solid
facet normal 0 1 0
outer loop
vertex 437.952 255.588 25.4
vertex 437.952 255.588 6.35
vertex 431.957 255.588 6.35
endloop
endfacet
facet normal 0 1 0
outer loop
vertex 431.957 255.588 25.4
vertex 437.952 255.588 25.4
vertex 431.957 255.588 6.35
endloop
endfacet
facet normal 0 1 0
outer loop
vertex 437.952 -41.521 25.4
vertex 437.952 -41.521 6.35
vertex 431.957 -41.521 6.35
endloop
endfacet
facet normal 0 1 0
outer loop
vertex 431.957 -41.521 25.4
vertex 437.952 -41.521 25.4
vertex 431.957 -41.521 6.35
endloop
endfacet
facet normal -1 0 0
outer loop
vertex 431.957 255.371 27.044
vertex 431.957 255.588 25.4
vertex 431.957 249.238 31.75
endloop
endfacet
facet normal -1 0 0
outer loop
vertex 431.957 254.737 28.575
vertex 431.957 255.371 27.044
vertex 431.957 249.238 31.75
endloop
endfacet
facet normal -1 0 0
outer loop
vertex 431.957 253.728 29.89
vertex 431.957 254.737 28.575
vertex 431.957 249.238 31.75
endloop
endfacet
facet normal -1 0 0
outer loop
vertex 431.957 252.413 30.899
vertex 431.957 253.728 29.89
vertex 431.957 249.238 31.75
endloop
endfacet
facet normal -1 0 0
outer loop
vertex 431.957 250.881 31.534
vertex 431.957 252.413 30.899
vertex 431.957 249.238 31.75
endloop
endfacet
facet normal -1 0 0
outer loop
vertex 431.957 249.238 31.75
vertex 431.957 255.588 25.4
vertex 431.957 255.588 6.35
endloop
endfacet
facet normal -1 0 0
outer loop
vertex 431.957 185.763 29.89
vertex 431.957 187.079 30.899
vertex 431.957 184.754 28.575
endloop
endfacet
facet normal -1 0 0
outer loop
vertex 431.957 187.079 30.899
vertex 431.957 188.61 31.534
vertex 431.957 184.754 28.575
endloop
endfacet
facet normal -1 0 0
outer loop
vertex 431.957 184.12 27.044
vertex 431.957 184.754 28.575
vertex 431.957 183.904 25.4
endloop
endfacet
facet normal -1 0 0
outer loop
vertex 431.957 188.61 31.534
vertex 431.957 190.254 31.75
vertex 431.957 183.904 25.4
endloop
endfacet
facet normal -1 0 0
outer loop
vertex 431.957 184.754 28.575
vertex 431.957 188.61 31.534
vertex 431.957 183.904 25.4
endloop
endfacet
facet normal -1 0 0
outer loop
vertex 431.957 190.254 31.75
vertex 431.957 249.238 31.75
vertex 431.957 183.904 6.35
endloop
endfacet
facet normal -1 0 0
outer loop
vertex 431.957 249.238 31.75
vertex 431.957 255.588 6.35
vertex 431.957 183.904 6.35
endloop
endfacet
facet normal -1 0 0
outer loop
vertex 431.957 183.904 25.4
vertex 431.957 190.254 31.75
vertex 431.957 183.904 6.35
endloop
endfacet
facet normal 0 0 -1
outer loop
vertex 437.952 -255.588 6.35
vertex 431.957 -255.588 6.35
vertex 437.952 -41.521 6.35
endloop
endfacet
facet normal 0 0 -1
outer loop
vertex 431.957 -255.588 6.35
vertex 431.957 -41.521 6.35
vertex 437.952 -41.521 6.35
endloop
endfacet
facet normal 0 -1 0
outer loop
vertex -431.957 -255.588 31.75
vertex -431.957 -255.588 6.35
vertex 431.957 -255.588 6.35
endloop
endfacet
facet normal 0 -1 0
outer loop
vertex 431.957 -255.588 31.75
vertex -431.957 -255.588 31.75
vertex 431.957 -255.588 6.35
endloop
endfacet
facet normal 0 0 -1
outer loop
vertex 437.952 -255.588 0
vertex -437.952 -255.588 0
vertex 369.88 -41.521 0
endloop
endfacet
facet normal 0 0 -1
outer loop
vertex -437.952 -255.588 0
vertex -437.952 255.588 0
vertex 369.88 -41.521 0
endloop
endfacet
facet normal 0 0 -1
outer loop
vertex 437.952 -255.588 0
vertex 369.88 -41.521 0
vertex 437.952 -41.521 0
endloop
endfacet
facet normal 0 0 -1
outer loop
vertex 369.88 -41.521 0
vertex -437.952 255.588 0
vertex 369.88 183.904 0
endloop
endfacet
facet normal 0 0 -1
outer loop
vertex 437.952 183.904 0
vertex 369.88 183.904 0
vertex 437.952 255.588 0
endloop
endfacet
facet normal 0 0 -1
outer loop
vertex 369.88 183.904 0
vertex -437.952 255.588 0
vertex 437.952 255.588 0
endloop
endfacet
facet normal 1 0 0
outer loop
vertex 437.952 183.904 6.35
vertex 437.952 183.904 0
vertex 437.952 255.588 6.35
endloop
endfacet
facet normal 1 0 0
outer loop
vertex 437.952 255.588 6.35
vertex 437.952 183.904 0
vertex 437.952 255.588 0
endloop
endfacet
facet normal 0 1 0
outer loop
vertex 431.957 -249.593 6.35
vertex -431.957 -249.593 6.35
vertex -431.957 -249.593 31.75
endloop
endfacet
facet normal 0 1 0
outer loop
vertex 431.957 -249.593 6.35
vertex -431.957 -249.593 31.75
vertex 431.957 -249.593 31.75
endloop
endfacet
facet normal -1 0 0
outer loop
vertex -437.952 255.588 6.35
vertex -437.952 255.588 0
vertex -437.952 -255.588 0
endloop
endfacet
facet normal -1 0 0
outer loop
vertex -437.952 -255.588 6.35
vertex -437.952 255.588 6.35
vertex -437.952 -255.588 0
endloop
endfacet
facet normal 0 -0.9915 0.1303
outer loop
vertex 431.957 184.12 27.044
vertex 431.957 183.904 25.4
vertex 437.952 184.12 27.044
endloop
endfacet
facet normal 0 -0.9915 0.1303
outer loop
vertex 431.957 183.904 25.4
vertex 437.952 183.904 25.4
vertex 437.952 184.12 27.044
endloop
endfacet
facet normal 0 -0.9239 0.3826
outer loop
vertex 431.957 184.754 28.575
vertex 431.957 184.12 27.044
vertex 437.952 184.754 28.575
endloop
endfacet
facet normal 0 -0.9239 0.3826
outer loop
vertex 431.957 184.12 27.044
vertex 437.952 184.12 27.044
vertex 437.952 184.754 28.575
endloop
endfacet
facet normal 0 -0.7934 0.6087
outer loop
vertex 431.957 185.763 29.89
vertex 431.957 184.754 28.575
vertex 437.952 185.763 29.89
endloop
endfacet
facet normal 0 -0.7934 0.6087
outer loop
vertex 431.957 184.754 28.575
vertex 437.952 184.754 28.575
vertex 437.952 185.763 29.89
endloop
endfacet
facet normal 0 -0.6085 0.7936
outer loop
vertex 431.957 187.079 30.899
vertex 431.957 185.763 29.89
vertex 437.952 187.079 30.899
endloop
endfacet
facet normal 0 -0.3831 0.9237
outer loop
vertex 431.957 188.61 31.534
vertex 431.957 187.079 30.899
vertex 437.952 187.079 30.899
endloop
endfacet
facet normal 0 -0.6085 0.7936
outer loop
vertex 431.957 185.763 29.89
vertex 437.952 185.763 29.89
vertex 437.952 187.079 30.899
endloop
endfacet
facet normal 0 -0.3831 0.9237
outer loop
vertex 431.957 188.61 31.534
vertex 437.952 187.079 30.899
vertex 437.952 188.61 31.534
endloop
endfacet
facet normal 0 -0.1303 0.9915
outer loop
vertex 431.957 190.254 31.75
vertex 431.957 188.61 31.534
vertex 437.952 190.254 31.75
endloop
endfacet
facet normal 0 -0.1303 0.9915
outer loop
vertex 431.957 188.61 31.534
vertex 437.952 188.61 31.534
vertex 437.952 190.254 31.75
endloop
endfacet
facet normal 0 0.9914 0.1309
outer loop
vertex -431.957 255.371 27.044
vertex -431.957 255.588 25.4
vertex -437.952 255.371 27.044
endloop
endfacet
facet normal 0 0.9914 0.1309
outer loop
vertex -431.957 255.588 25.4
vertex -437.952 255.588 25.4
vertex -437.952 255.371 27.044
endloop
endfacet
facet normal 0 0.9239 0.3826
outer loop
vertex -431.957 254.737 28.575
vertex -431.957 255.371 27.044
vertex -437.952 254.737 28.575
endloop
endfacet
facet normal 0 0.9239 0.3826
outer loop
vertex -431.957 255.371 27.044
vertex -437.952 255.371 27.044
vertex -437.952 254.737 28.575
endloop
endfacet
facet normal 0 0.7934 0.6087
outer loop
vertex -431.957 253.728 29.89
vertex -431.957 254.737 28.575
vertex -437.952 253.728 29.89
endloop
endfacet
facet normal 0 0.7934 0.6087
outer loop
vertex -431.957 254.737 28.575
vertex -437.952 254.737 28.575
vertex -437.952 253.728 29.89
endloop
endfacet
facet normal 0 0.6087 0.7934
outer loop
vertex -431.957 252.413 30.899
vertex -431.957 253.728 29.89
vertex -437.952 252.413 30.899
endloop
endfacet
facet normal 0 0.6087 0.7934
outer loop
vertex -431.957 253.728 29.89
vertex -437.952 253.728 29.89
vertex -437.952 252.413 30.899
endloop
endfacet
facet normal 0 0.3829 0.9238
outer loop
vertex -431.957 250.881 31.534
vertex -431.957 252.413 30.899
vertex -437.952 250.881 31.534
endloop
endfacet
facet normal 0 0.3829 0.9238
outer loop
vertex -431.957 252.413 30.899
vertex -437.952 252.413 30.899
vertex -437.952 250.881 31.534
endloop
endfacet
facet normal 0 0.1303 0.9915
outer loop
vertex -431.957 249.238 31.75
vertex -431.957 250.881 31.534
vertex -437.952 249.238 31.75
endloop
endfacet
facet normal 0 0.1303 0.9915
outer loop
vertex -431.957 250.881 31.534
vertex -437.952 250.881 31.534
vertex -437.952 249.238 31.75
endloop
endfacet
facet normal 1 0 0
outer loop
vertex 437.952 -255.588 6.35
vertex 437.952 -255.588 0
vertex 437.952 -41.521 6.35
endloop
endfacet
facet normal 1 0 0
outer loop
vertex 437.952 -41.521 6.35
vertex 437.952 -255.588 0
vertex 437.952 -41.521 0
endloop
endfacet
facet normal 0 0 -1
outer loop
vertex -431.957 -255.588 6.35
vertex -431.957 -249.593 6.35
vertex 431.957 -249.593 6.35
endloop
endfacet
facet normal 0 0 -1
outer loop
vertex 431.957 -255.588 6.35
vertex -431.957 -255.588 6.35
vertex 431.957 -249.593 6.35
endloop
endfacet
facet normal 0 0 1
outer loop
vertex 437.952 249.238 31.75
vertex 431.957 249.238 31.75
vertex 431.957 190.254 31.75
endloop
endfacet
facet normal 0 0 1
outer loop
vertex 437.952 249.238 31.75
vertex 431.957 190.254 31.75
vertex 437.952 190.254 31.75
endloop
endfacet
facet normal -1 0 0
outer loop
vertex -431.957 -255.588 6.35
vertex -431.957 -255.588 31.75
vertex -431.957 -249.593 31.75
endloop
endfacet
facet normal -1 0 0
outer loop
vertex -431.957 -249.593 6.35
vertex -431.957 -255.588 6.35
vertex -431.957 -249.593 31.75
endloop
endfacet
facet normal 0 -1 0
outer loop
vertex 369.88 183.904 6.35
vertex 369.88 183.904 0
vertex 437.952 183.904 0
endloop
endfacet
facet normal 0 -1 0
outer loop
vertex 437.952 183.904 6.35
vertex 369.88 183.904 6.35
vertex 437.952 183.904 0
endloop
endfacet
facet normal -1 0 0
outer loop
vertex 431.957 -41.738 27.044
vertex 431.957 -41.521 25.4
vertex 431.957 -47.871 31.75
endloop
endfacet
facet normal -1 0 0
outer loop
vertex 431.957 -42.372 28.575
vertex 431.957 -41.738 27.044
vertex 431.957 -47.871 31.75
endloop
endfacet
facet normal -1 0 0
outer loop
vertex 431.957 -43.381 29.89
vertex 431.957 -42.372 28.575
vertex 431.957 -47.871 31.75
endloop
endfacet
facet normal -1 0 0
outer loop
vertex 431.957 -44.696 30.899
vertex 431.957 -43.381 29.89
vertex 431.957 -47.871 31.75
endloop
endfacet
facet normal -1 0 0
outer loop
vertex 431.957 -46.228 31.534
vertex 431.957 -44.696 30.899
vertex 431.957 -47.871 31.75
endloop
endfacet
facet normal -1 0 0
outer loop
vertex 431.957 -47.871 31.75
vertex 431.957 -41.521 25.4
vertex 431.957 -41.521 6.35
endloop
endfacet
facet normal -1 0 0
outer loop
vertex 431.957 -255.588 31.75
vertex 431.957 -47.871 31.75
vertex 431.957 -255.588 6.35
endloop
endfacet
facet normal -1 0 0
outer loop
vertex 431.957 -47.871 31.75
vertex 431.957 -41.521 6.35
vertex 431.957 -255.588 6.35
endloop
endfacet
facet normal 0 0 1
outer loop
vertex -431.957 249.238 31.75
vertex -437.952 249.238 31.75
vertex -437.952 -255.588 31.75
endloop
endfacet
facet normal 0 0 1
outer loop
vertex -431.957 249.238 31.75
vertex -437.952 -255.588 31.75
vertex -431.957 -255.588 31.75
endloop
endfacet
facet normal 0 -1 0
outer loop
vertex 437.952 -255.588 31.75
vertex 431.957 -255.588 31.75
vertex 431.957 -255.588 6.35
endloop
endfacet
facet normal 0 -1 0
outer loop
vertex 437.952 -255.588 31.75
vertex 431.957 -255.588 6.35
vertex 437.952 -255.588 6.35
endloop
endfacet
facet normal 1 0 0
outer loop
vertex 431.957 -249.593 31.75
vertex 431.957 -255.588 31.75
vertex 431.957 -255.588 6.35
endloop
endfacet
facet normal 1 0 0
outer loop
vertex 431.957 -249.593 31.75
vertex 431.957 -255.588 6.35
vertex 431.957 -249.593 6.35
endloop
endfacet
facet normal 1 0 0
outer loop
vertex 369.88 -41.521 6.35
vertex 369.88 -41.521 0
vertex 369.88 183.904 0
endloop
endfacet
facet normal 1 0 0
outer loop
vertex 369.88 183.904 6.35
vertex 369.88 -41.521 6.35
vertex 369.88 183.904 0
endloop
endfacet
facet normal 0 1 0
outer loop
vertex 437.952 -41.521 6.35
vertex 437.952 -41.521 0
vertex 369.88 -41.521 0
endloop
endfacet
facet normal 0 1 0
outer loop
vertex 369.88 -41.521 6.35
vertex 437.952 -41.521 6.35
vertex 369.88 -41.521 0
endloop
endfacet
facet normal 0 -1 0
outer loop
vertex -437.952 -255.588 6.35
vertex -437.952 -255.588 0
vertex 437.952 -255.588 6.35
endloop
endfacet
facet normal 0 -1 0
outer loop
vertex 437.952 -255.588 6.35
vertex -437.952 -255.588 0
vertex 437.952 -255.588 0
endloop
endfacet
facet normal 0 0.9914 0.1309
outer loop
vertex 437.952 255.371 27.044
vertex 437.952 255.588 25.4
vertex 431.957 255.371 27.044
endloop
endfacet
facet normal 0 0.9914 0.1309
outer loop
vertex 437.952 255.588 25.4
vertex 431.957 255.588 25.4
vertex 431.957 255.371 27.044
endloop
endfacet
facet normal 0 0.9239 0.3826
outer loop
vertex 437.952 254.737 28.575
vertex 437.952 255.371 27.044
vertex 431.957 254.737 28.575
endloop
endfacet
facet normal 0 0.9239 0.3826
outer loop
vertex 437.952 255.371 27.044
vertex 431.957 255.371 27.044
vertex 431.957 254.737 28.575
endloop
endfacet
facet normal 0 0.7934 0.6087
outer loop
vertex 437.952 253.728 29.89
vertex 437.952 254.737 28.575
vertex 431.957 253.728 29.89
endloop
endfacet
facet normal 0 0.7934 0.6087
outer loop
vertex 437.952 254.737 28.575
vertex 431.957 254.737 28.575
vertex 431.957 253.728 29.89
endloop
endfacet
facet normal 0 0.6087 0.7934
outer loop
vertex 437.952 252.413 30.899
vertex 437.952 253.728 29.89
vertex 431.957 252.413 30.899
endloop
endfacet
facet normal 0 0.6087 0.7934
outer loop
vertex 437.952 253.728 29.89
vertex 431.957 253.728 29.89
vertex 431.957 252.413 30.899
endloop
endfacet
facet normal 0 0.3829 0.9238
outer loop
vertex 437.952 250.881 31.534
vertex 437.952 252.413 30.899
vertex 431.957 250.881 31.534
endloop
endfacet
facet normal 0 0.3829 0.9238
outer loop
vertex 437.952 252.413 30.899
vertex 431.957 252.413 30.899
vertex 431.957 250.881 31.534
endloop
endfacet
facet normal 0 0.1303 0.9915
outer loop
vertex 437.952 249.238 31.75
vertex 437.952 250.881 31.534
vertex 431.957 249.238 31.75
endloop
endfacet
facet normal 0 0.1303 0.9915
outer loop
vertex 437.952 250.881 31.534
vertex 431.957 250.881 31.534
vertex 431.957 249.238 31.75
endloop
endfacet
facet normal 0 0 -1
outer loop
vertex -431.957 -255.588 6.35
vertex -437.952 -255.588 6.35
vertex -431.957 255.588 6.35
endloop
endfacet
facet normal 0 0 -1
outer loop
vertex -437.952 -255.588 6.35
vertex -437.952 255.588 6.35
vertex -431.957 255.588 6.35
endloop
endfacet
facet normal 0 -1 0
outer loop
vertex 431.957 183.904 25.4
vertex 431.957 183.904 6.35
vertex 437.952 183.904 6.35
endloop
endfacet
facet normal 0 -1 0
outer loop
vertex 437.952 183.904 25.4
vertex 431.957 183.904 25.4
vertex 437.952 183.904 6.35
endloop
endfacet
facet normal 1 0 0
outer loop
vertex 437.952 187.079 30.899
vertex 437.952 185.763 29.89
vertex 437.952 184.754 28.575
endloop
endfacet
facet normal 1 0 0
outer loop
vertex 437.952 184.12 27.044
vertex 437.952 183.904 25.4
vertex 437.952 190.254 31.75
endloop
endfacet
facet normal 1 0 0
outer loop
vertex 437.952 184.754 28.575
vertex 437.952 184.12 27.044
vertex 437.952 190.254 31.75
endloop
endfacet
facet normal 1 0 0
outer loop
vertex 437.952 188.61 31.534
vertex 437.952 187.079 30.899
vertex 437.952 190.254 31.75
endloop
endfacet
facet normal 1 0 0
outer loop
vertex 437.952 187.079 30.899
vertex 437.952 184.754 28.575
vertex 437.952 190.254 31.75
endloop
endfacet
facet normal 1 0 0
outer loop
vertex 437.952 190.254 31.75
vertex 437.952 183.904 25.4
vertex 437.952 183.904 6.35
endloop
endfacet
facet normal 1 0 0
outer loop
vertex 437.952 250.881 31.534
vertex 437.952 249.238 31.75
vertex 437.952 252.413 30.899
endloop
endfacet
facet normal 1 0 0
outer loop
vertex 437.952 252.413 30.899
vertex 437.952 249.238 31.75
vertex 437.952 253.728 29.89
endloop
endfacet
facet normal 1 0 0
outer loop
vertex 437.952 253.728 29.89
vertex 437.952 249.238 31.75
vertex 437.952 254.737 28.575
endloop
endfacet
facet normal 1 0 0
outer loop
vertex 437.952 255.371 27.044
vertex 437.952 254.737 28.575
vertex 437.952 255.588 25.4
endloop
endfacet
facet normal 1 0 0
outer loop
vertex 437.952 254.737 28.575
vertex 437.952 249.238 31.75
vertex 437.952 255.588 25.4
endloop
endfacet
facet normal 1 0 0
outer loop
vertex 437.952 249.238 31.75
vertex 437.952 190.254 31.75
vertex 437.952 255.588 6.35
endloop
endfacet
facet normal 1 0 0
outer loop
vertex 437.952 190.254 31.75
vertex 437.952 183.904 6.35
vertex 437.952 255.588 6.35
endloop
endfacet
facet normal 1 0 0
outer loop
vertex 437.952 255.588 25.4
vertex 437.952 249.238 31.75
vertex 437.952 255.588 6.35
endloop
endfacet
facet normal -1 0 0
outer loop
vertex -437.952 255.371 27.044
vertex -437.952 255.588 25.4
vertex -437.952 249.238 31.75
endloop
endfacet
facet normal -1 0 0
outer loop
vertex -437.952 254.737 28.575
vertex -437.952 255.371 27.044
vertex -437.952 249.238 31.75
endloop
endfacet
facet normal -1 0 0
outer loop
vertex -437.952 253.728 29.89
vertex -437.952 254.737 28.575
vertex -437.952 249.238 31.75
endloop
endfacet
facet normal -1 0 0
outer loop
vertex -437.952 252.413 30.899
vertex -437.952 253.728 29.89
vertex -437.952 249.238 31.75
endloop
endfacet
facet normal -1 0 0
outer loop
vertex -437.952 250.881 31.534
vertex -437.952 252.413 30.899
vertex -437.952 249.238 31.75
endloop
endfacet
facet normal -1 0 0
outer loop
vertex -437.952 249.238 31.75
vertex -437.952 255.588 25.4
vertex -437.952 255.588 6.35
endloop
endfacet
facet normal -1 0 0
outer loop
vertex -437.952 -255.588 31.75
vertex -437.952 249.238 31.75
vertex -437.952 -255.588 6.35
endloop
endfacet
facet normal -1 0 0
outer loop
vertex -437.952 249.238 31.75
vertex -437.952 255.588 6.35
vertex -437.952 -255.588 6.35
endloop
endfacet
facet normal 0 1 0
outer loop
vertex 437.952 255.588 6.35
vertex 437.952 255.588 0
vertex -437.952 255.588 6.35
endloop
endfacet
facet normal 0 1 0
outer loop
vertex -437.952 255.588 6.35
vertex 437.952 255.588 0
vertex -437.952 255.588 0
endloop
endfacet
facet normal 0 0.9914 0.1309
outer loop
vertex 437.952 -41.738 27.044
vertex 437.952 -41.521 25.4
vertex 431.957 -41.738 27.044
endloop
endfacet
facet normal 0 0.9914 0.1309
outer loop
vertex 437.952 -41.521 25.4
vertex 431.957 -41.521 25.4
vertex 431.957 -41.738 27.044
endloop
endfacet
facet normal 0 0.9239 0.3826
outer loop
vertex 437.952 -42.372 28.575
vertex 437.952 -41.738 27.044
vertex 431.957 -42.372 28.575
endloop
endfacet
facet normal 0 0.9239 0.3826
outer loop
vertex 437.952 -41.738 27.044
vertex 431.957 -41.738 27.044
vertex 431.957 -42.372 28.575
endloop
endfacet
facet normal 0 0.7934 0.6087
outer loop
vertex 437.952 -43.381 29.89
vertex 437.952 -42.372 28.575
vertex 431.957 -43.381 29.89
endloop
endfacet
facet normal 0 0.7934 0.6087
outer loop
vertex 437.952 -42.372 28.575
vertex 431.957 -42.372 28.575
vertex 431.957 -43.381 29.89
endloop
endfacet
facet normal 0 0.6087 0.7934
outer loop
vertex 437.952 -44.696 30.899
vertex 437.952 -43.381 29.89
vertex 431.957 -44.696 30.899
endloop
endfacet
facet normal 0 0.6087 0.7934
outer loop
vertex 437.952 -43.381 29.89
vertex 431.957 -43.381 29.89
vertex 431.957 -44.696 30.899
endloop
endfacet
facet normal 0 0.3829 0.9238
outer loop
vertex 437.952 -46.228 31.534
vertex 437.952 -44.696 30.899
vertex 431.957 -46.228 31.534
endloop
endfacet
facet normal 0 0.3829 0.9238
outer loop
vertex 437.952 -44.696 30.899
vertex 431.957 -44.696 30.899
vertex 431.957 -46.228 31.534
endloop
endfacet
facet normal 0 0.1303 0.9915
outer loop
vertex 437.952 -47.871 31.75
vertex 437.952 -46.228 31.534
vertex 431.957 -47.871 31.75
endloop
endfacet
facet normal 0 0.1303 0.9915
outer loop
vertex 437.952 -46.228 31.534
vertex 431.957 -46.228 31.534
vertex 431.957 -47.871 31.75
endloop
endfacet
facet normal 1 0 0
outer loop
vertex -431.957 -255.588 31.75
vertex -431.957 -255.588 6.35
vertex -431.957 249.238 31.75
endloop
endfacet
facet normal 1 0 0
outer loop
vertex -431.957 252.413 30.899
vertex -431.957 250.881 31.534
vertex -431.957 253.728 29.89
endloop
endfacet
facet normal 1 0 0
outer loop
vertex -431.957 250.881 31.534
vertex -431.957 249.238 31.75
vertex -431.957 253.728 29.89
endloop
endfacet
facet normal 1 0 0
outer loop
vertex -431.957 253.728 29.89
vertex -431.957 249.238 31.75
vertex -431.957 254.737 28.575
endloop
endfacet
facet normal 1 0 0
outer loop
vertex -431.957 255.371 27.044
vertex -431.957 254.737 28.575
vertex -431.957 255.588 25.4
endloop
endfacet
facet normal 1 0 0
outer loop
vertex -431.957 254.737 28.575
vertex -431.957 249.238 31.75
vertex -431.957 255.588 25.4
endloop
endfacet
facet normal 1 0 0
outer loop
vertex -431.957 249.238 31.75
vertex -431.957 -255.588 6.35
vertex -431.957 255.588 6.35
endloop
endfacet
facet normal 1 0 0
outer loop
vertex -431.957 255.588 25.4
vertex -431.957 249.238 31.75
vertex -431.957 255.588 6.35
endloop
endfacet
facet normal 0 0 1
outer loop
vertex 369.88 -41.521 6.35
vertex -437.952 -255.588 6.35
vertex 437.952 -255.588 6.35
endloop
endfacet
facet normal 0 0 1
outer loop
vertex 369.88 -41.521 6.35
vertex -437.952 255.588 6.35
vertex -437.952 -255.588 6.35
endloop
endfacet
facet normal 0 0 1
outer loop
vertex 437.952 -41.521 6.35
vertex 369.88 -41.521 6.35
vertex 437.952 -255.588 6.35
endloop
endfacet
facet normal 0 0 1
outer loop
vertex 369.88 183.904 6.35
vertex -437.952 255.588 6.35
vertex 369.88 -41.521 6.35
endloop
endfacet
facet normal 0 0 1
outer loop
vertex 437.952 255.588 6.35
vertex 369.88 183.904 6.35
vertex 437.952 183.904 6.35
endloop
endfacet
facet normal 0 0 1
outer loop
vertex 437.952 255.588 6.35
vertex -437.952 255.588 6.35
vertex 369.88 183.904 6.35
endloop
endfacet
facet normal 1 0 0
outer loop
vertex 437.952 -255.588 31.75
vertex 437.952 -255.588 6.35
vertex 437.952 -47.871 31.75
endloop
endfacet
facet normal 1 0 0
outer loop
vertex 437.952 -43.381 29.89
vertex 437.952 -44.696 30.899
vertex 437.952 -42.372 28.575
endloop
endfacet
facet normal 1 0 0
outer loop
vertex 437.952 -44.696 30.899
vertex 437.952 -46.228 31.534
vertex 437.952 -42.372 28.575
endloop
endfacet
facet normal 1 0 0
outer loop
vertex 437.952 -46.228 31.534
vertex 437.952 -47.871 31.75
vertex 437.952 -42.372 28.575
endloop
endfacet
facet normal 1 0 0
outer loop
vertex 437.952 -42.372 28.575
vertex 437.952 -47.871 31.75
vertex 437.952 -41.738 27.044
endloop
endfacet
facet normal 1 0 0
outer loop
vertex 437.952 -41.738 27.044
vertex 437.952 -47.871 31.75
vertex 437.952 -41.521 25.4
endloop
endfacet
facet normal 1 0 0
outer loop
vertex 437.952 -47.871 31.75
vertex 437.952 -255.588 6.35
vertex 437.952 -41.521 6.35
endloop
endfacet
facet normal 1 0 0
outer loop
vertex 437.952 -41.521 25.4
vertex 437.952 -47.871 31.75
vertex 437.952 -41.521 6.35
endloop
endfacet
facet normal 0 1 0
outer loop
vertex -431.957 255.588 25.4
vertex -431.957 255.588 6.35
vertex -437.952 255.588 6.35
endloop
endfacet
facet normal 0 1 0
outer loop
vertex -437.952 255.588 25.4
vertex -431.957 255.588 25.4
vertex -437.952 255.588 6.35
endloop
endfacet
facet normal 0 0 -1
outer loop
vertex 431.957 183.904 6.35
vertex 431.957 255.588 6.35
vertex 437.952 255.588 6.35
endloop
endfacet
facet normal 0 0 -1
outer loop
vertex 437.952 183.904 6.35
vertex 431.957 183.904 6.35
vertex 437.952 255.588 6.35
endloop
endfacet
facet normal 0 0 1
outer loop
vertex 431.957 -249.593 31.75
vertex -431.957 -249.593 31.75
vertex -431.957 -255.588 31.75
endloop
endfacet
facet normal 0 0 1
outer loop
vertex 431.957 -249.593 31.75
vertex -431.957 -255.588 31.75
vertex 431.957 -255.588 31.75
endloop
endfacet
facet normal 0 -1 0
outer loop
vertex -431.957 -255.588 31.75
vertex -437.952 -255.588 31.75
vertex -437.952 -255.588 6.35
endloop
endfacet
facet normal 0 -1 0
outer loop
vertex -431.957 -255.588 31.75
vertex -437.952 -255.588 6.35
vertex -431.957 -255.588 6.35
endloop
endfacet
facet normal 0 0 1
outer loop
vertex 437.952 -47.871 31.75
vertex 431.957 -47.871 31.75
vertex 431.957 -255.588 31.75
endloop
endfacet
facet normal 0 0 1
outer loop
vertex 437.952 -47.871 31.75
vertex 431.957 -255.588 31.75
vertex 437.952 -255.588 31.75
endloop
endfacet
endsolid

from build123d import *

# Parameters (mm, degrees)
F1_DEPTH = 6.35
F3_DEPTH = 25.4
F4_DEPTH = 25.4
F2_W     = 863.914325
F2_H     = 5.9944
F5_DEPTH = 25.4
F6_DEPTH = 25.4
F7_R     = 6.35
F7_2_R   = 6.35
F7_3_R   = 6.35


with BuildPart() as f1:
    # F0 (on Top) → F1 (new body)
    with BuildSketch(Plane.XY):
        Polygon((-437.9515625, -255.5875), (437.9515625, -255.5875), (437.9515625, -41.52138), (369.8795625, -41.52138), (369.8795625, 183.90362), (437.9515625, 183.90362), (437.9515625, 255.5875), (-437.9515625, 255.5875), align=None)
    extrude(amount=F1_DEPTH)


with BuildPart() as f3:
    # F2 (on face) → F3 (new body)
    with BuildSketch(Plane.XY.offset(6.35)):
        Polygon((-437.9515625, -255.5875), (-431.9571625, -255.5875), (-431.9571625, -249.5931), (-431.9571625, 255.5875), (-437.9515625, 255.5875), align=None)
    extrude(amount=F3_DEPTH)

    # F7#3
    f7_3_edges = [f3.edges().sort_by_distance(p)[0] for p in [
        (-434.954363, 255.5875, 31.75),
    ]]
    fillet(f7_3_edges, radius=F7_3_R)


with BuildPart() as f4:
    # F2 (on face) → F4 (new body)
    with BuildSketch(Plane.XY.offset(6.35)):
        Polygon((431.9571625, -249.5931), (431.9571625, -255.5875), (437.9515625, -255.5875), (437.9515625, -41.52138), (431.9571625, -41.52138), align=None)
    extrude(amount=F4_DEPTH)

    # F7#2
    f7_2_edges = [f4.edges().sort_by_distance(p)[0] for p in [
        (434.954363, -41.52138, 31.75),
    ]]
    fillet(f7_2_edges, radius=F7_2_R)


with BuildPart() as f5:
    # F2 (on face) → F5 (new body)
    with BuildSketch(Plane.XY.offset(6.35)):
        with Locations((0, -252.5903)):
            Rectangle(F2_W, F2_H)
    extrude(amount=F5_DEPTH)


with BuildPart() as f6:
    # F2 (on face) → F6 (new body)
    with BuildSketch(Plane.XY.offset(6.35)):
        Polygon((437.9515625, 255.5875), (431.9571625, 255.5875), (431.9571625, 183.90362), (437.9515625, 183.90362), align=None)
    extrude(amount=F6_DEPTH)

    # F7
    f7_edges = [f6.edges().sort_by_distance(p)[0] for p in [
        (434.954362, 183.90362, 31.75),
        (434.954363, 255.5875, 31.75),
    ]]
    fillet(f7_edges, radius=F7_R)


solid = Compound([f1.part, f3.part, f4.part, f5.part, f6.part])
